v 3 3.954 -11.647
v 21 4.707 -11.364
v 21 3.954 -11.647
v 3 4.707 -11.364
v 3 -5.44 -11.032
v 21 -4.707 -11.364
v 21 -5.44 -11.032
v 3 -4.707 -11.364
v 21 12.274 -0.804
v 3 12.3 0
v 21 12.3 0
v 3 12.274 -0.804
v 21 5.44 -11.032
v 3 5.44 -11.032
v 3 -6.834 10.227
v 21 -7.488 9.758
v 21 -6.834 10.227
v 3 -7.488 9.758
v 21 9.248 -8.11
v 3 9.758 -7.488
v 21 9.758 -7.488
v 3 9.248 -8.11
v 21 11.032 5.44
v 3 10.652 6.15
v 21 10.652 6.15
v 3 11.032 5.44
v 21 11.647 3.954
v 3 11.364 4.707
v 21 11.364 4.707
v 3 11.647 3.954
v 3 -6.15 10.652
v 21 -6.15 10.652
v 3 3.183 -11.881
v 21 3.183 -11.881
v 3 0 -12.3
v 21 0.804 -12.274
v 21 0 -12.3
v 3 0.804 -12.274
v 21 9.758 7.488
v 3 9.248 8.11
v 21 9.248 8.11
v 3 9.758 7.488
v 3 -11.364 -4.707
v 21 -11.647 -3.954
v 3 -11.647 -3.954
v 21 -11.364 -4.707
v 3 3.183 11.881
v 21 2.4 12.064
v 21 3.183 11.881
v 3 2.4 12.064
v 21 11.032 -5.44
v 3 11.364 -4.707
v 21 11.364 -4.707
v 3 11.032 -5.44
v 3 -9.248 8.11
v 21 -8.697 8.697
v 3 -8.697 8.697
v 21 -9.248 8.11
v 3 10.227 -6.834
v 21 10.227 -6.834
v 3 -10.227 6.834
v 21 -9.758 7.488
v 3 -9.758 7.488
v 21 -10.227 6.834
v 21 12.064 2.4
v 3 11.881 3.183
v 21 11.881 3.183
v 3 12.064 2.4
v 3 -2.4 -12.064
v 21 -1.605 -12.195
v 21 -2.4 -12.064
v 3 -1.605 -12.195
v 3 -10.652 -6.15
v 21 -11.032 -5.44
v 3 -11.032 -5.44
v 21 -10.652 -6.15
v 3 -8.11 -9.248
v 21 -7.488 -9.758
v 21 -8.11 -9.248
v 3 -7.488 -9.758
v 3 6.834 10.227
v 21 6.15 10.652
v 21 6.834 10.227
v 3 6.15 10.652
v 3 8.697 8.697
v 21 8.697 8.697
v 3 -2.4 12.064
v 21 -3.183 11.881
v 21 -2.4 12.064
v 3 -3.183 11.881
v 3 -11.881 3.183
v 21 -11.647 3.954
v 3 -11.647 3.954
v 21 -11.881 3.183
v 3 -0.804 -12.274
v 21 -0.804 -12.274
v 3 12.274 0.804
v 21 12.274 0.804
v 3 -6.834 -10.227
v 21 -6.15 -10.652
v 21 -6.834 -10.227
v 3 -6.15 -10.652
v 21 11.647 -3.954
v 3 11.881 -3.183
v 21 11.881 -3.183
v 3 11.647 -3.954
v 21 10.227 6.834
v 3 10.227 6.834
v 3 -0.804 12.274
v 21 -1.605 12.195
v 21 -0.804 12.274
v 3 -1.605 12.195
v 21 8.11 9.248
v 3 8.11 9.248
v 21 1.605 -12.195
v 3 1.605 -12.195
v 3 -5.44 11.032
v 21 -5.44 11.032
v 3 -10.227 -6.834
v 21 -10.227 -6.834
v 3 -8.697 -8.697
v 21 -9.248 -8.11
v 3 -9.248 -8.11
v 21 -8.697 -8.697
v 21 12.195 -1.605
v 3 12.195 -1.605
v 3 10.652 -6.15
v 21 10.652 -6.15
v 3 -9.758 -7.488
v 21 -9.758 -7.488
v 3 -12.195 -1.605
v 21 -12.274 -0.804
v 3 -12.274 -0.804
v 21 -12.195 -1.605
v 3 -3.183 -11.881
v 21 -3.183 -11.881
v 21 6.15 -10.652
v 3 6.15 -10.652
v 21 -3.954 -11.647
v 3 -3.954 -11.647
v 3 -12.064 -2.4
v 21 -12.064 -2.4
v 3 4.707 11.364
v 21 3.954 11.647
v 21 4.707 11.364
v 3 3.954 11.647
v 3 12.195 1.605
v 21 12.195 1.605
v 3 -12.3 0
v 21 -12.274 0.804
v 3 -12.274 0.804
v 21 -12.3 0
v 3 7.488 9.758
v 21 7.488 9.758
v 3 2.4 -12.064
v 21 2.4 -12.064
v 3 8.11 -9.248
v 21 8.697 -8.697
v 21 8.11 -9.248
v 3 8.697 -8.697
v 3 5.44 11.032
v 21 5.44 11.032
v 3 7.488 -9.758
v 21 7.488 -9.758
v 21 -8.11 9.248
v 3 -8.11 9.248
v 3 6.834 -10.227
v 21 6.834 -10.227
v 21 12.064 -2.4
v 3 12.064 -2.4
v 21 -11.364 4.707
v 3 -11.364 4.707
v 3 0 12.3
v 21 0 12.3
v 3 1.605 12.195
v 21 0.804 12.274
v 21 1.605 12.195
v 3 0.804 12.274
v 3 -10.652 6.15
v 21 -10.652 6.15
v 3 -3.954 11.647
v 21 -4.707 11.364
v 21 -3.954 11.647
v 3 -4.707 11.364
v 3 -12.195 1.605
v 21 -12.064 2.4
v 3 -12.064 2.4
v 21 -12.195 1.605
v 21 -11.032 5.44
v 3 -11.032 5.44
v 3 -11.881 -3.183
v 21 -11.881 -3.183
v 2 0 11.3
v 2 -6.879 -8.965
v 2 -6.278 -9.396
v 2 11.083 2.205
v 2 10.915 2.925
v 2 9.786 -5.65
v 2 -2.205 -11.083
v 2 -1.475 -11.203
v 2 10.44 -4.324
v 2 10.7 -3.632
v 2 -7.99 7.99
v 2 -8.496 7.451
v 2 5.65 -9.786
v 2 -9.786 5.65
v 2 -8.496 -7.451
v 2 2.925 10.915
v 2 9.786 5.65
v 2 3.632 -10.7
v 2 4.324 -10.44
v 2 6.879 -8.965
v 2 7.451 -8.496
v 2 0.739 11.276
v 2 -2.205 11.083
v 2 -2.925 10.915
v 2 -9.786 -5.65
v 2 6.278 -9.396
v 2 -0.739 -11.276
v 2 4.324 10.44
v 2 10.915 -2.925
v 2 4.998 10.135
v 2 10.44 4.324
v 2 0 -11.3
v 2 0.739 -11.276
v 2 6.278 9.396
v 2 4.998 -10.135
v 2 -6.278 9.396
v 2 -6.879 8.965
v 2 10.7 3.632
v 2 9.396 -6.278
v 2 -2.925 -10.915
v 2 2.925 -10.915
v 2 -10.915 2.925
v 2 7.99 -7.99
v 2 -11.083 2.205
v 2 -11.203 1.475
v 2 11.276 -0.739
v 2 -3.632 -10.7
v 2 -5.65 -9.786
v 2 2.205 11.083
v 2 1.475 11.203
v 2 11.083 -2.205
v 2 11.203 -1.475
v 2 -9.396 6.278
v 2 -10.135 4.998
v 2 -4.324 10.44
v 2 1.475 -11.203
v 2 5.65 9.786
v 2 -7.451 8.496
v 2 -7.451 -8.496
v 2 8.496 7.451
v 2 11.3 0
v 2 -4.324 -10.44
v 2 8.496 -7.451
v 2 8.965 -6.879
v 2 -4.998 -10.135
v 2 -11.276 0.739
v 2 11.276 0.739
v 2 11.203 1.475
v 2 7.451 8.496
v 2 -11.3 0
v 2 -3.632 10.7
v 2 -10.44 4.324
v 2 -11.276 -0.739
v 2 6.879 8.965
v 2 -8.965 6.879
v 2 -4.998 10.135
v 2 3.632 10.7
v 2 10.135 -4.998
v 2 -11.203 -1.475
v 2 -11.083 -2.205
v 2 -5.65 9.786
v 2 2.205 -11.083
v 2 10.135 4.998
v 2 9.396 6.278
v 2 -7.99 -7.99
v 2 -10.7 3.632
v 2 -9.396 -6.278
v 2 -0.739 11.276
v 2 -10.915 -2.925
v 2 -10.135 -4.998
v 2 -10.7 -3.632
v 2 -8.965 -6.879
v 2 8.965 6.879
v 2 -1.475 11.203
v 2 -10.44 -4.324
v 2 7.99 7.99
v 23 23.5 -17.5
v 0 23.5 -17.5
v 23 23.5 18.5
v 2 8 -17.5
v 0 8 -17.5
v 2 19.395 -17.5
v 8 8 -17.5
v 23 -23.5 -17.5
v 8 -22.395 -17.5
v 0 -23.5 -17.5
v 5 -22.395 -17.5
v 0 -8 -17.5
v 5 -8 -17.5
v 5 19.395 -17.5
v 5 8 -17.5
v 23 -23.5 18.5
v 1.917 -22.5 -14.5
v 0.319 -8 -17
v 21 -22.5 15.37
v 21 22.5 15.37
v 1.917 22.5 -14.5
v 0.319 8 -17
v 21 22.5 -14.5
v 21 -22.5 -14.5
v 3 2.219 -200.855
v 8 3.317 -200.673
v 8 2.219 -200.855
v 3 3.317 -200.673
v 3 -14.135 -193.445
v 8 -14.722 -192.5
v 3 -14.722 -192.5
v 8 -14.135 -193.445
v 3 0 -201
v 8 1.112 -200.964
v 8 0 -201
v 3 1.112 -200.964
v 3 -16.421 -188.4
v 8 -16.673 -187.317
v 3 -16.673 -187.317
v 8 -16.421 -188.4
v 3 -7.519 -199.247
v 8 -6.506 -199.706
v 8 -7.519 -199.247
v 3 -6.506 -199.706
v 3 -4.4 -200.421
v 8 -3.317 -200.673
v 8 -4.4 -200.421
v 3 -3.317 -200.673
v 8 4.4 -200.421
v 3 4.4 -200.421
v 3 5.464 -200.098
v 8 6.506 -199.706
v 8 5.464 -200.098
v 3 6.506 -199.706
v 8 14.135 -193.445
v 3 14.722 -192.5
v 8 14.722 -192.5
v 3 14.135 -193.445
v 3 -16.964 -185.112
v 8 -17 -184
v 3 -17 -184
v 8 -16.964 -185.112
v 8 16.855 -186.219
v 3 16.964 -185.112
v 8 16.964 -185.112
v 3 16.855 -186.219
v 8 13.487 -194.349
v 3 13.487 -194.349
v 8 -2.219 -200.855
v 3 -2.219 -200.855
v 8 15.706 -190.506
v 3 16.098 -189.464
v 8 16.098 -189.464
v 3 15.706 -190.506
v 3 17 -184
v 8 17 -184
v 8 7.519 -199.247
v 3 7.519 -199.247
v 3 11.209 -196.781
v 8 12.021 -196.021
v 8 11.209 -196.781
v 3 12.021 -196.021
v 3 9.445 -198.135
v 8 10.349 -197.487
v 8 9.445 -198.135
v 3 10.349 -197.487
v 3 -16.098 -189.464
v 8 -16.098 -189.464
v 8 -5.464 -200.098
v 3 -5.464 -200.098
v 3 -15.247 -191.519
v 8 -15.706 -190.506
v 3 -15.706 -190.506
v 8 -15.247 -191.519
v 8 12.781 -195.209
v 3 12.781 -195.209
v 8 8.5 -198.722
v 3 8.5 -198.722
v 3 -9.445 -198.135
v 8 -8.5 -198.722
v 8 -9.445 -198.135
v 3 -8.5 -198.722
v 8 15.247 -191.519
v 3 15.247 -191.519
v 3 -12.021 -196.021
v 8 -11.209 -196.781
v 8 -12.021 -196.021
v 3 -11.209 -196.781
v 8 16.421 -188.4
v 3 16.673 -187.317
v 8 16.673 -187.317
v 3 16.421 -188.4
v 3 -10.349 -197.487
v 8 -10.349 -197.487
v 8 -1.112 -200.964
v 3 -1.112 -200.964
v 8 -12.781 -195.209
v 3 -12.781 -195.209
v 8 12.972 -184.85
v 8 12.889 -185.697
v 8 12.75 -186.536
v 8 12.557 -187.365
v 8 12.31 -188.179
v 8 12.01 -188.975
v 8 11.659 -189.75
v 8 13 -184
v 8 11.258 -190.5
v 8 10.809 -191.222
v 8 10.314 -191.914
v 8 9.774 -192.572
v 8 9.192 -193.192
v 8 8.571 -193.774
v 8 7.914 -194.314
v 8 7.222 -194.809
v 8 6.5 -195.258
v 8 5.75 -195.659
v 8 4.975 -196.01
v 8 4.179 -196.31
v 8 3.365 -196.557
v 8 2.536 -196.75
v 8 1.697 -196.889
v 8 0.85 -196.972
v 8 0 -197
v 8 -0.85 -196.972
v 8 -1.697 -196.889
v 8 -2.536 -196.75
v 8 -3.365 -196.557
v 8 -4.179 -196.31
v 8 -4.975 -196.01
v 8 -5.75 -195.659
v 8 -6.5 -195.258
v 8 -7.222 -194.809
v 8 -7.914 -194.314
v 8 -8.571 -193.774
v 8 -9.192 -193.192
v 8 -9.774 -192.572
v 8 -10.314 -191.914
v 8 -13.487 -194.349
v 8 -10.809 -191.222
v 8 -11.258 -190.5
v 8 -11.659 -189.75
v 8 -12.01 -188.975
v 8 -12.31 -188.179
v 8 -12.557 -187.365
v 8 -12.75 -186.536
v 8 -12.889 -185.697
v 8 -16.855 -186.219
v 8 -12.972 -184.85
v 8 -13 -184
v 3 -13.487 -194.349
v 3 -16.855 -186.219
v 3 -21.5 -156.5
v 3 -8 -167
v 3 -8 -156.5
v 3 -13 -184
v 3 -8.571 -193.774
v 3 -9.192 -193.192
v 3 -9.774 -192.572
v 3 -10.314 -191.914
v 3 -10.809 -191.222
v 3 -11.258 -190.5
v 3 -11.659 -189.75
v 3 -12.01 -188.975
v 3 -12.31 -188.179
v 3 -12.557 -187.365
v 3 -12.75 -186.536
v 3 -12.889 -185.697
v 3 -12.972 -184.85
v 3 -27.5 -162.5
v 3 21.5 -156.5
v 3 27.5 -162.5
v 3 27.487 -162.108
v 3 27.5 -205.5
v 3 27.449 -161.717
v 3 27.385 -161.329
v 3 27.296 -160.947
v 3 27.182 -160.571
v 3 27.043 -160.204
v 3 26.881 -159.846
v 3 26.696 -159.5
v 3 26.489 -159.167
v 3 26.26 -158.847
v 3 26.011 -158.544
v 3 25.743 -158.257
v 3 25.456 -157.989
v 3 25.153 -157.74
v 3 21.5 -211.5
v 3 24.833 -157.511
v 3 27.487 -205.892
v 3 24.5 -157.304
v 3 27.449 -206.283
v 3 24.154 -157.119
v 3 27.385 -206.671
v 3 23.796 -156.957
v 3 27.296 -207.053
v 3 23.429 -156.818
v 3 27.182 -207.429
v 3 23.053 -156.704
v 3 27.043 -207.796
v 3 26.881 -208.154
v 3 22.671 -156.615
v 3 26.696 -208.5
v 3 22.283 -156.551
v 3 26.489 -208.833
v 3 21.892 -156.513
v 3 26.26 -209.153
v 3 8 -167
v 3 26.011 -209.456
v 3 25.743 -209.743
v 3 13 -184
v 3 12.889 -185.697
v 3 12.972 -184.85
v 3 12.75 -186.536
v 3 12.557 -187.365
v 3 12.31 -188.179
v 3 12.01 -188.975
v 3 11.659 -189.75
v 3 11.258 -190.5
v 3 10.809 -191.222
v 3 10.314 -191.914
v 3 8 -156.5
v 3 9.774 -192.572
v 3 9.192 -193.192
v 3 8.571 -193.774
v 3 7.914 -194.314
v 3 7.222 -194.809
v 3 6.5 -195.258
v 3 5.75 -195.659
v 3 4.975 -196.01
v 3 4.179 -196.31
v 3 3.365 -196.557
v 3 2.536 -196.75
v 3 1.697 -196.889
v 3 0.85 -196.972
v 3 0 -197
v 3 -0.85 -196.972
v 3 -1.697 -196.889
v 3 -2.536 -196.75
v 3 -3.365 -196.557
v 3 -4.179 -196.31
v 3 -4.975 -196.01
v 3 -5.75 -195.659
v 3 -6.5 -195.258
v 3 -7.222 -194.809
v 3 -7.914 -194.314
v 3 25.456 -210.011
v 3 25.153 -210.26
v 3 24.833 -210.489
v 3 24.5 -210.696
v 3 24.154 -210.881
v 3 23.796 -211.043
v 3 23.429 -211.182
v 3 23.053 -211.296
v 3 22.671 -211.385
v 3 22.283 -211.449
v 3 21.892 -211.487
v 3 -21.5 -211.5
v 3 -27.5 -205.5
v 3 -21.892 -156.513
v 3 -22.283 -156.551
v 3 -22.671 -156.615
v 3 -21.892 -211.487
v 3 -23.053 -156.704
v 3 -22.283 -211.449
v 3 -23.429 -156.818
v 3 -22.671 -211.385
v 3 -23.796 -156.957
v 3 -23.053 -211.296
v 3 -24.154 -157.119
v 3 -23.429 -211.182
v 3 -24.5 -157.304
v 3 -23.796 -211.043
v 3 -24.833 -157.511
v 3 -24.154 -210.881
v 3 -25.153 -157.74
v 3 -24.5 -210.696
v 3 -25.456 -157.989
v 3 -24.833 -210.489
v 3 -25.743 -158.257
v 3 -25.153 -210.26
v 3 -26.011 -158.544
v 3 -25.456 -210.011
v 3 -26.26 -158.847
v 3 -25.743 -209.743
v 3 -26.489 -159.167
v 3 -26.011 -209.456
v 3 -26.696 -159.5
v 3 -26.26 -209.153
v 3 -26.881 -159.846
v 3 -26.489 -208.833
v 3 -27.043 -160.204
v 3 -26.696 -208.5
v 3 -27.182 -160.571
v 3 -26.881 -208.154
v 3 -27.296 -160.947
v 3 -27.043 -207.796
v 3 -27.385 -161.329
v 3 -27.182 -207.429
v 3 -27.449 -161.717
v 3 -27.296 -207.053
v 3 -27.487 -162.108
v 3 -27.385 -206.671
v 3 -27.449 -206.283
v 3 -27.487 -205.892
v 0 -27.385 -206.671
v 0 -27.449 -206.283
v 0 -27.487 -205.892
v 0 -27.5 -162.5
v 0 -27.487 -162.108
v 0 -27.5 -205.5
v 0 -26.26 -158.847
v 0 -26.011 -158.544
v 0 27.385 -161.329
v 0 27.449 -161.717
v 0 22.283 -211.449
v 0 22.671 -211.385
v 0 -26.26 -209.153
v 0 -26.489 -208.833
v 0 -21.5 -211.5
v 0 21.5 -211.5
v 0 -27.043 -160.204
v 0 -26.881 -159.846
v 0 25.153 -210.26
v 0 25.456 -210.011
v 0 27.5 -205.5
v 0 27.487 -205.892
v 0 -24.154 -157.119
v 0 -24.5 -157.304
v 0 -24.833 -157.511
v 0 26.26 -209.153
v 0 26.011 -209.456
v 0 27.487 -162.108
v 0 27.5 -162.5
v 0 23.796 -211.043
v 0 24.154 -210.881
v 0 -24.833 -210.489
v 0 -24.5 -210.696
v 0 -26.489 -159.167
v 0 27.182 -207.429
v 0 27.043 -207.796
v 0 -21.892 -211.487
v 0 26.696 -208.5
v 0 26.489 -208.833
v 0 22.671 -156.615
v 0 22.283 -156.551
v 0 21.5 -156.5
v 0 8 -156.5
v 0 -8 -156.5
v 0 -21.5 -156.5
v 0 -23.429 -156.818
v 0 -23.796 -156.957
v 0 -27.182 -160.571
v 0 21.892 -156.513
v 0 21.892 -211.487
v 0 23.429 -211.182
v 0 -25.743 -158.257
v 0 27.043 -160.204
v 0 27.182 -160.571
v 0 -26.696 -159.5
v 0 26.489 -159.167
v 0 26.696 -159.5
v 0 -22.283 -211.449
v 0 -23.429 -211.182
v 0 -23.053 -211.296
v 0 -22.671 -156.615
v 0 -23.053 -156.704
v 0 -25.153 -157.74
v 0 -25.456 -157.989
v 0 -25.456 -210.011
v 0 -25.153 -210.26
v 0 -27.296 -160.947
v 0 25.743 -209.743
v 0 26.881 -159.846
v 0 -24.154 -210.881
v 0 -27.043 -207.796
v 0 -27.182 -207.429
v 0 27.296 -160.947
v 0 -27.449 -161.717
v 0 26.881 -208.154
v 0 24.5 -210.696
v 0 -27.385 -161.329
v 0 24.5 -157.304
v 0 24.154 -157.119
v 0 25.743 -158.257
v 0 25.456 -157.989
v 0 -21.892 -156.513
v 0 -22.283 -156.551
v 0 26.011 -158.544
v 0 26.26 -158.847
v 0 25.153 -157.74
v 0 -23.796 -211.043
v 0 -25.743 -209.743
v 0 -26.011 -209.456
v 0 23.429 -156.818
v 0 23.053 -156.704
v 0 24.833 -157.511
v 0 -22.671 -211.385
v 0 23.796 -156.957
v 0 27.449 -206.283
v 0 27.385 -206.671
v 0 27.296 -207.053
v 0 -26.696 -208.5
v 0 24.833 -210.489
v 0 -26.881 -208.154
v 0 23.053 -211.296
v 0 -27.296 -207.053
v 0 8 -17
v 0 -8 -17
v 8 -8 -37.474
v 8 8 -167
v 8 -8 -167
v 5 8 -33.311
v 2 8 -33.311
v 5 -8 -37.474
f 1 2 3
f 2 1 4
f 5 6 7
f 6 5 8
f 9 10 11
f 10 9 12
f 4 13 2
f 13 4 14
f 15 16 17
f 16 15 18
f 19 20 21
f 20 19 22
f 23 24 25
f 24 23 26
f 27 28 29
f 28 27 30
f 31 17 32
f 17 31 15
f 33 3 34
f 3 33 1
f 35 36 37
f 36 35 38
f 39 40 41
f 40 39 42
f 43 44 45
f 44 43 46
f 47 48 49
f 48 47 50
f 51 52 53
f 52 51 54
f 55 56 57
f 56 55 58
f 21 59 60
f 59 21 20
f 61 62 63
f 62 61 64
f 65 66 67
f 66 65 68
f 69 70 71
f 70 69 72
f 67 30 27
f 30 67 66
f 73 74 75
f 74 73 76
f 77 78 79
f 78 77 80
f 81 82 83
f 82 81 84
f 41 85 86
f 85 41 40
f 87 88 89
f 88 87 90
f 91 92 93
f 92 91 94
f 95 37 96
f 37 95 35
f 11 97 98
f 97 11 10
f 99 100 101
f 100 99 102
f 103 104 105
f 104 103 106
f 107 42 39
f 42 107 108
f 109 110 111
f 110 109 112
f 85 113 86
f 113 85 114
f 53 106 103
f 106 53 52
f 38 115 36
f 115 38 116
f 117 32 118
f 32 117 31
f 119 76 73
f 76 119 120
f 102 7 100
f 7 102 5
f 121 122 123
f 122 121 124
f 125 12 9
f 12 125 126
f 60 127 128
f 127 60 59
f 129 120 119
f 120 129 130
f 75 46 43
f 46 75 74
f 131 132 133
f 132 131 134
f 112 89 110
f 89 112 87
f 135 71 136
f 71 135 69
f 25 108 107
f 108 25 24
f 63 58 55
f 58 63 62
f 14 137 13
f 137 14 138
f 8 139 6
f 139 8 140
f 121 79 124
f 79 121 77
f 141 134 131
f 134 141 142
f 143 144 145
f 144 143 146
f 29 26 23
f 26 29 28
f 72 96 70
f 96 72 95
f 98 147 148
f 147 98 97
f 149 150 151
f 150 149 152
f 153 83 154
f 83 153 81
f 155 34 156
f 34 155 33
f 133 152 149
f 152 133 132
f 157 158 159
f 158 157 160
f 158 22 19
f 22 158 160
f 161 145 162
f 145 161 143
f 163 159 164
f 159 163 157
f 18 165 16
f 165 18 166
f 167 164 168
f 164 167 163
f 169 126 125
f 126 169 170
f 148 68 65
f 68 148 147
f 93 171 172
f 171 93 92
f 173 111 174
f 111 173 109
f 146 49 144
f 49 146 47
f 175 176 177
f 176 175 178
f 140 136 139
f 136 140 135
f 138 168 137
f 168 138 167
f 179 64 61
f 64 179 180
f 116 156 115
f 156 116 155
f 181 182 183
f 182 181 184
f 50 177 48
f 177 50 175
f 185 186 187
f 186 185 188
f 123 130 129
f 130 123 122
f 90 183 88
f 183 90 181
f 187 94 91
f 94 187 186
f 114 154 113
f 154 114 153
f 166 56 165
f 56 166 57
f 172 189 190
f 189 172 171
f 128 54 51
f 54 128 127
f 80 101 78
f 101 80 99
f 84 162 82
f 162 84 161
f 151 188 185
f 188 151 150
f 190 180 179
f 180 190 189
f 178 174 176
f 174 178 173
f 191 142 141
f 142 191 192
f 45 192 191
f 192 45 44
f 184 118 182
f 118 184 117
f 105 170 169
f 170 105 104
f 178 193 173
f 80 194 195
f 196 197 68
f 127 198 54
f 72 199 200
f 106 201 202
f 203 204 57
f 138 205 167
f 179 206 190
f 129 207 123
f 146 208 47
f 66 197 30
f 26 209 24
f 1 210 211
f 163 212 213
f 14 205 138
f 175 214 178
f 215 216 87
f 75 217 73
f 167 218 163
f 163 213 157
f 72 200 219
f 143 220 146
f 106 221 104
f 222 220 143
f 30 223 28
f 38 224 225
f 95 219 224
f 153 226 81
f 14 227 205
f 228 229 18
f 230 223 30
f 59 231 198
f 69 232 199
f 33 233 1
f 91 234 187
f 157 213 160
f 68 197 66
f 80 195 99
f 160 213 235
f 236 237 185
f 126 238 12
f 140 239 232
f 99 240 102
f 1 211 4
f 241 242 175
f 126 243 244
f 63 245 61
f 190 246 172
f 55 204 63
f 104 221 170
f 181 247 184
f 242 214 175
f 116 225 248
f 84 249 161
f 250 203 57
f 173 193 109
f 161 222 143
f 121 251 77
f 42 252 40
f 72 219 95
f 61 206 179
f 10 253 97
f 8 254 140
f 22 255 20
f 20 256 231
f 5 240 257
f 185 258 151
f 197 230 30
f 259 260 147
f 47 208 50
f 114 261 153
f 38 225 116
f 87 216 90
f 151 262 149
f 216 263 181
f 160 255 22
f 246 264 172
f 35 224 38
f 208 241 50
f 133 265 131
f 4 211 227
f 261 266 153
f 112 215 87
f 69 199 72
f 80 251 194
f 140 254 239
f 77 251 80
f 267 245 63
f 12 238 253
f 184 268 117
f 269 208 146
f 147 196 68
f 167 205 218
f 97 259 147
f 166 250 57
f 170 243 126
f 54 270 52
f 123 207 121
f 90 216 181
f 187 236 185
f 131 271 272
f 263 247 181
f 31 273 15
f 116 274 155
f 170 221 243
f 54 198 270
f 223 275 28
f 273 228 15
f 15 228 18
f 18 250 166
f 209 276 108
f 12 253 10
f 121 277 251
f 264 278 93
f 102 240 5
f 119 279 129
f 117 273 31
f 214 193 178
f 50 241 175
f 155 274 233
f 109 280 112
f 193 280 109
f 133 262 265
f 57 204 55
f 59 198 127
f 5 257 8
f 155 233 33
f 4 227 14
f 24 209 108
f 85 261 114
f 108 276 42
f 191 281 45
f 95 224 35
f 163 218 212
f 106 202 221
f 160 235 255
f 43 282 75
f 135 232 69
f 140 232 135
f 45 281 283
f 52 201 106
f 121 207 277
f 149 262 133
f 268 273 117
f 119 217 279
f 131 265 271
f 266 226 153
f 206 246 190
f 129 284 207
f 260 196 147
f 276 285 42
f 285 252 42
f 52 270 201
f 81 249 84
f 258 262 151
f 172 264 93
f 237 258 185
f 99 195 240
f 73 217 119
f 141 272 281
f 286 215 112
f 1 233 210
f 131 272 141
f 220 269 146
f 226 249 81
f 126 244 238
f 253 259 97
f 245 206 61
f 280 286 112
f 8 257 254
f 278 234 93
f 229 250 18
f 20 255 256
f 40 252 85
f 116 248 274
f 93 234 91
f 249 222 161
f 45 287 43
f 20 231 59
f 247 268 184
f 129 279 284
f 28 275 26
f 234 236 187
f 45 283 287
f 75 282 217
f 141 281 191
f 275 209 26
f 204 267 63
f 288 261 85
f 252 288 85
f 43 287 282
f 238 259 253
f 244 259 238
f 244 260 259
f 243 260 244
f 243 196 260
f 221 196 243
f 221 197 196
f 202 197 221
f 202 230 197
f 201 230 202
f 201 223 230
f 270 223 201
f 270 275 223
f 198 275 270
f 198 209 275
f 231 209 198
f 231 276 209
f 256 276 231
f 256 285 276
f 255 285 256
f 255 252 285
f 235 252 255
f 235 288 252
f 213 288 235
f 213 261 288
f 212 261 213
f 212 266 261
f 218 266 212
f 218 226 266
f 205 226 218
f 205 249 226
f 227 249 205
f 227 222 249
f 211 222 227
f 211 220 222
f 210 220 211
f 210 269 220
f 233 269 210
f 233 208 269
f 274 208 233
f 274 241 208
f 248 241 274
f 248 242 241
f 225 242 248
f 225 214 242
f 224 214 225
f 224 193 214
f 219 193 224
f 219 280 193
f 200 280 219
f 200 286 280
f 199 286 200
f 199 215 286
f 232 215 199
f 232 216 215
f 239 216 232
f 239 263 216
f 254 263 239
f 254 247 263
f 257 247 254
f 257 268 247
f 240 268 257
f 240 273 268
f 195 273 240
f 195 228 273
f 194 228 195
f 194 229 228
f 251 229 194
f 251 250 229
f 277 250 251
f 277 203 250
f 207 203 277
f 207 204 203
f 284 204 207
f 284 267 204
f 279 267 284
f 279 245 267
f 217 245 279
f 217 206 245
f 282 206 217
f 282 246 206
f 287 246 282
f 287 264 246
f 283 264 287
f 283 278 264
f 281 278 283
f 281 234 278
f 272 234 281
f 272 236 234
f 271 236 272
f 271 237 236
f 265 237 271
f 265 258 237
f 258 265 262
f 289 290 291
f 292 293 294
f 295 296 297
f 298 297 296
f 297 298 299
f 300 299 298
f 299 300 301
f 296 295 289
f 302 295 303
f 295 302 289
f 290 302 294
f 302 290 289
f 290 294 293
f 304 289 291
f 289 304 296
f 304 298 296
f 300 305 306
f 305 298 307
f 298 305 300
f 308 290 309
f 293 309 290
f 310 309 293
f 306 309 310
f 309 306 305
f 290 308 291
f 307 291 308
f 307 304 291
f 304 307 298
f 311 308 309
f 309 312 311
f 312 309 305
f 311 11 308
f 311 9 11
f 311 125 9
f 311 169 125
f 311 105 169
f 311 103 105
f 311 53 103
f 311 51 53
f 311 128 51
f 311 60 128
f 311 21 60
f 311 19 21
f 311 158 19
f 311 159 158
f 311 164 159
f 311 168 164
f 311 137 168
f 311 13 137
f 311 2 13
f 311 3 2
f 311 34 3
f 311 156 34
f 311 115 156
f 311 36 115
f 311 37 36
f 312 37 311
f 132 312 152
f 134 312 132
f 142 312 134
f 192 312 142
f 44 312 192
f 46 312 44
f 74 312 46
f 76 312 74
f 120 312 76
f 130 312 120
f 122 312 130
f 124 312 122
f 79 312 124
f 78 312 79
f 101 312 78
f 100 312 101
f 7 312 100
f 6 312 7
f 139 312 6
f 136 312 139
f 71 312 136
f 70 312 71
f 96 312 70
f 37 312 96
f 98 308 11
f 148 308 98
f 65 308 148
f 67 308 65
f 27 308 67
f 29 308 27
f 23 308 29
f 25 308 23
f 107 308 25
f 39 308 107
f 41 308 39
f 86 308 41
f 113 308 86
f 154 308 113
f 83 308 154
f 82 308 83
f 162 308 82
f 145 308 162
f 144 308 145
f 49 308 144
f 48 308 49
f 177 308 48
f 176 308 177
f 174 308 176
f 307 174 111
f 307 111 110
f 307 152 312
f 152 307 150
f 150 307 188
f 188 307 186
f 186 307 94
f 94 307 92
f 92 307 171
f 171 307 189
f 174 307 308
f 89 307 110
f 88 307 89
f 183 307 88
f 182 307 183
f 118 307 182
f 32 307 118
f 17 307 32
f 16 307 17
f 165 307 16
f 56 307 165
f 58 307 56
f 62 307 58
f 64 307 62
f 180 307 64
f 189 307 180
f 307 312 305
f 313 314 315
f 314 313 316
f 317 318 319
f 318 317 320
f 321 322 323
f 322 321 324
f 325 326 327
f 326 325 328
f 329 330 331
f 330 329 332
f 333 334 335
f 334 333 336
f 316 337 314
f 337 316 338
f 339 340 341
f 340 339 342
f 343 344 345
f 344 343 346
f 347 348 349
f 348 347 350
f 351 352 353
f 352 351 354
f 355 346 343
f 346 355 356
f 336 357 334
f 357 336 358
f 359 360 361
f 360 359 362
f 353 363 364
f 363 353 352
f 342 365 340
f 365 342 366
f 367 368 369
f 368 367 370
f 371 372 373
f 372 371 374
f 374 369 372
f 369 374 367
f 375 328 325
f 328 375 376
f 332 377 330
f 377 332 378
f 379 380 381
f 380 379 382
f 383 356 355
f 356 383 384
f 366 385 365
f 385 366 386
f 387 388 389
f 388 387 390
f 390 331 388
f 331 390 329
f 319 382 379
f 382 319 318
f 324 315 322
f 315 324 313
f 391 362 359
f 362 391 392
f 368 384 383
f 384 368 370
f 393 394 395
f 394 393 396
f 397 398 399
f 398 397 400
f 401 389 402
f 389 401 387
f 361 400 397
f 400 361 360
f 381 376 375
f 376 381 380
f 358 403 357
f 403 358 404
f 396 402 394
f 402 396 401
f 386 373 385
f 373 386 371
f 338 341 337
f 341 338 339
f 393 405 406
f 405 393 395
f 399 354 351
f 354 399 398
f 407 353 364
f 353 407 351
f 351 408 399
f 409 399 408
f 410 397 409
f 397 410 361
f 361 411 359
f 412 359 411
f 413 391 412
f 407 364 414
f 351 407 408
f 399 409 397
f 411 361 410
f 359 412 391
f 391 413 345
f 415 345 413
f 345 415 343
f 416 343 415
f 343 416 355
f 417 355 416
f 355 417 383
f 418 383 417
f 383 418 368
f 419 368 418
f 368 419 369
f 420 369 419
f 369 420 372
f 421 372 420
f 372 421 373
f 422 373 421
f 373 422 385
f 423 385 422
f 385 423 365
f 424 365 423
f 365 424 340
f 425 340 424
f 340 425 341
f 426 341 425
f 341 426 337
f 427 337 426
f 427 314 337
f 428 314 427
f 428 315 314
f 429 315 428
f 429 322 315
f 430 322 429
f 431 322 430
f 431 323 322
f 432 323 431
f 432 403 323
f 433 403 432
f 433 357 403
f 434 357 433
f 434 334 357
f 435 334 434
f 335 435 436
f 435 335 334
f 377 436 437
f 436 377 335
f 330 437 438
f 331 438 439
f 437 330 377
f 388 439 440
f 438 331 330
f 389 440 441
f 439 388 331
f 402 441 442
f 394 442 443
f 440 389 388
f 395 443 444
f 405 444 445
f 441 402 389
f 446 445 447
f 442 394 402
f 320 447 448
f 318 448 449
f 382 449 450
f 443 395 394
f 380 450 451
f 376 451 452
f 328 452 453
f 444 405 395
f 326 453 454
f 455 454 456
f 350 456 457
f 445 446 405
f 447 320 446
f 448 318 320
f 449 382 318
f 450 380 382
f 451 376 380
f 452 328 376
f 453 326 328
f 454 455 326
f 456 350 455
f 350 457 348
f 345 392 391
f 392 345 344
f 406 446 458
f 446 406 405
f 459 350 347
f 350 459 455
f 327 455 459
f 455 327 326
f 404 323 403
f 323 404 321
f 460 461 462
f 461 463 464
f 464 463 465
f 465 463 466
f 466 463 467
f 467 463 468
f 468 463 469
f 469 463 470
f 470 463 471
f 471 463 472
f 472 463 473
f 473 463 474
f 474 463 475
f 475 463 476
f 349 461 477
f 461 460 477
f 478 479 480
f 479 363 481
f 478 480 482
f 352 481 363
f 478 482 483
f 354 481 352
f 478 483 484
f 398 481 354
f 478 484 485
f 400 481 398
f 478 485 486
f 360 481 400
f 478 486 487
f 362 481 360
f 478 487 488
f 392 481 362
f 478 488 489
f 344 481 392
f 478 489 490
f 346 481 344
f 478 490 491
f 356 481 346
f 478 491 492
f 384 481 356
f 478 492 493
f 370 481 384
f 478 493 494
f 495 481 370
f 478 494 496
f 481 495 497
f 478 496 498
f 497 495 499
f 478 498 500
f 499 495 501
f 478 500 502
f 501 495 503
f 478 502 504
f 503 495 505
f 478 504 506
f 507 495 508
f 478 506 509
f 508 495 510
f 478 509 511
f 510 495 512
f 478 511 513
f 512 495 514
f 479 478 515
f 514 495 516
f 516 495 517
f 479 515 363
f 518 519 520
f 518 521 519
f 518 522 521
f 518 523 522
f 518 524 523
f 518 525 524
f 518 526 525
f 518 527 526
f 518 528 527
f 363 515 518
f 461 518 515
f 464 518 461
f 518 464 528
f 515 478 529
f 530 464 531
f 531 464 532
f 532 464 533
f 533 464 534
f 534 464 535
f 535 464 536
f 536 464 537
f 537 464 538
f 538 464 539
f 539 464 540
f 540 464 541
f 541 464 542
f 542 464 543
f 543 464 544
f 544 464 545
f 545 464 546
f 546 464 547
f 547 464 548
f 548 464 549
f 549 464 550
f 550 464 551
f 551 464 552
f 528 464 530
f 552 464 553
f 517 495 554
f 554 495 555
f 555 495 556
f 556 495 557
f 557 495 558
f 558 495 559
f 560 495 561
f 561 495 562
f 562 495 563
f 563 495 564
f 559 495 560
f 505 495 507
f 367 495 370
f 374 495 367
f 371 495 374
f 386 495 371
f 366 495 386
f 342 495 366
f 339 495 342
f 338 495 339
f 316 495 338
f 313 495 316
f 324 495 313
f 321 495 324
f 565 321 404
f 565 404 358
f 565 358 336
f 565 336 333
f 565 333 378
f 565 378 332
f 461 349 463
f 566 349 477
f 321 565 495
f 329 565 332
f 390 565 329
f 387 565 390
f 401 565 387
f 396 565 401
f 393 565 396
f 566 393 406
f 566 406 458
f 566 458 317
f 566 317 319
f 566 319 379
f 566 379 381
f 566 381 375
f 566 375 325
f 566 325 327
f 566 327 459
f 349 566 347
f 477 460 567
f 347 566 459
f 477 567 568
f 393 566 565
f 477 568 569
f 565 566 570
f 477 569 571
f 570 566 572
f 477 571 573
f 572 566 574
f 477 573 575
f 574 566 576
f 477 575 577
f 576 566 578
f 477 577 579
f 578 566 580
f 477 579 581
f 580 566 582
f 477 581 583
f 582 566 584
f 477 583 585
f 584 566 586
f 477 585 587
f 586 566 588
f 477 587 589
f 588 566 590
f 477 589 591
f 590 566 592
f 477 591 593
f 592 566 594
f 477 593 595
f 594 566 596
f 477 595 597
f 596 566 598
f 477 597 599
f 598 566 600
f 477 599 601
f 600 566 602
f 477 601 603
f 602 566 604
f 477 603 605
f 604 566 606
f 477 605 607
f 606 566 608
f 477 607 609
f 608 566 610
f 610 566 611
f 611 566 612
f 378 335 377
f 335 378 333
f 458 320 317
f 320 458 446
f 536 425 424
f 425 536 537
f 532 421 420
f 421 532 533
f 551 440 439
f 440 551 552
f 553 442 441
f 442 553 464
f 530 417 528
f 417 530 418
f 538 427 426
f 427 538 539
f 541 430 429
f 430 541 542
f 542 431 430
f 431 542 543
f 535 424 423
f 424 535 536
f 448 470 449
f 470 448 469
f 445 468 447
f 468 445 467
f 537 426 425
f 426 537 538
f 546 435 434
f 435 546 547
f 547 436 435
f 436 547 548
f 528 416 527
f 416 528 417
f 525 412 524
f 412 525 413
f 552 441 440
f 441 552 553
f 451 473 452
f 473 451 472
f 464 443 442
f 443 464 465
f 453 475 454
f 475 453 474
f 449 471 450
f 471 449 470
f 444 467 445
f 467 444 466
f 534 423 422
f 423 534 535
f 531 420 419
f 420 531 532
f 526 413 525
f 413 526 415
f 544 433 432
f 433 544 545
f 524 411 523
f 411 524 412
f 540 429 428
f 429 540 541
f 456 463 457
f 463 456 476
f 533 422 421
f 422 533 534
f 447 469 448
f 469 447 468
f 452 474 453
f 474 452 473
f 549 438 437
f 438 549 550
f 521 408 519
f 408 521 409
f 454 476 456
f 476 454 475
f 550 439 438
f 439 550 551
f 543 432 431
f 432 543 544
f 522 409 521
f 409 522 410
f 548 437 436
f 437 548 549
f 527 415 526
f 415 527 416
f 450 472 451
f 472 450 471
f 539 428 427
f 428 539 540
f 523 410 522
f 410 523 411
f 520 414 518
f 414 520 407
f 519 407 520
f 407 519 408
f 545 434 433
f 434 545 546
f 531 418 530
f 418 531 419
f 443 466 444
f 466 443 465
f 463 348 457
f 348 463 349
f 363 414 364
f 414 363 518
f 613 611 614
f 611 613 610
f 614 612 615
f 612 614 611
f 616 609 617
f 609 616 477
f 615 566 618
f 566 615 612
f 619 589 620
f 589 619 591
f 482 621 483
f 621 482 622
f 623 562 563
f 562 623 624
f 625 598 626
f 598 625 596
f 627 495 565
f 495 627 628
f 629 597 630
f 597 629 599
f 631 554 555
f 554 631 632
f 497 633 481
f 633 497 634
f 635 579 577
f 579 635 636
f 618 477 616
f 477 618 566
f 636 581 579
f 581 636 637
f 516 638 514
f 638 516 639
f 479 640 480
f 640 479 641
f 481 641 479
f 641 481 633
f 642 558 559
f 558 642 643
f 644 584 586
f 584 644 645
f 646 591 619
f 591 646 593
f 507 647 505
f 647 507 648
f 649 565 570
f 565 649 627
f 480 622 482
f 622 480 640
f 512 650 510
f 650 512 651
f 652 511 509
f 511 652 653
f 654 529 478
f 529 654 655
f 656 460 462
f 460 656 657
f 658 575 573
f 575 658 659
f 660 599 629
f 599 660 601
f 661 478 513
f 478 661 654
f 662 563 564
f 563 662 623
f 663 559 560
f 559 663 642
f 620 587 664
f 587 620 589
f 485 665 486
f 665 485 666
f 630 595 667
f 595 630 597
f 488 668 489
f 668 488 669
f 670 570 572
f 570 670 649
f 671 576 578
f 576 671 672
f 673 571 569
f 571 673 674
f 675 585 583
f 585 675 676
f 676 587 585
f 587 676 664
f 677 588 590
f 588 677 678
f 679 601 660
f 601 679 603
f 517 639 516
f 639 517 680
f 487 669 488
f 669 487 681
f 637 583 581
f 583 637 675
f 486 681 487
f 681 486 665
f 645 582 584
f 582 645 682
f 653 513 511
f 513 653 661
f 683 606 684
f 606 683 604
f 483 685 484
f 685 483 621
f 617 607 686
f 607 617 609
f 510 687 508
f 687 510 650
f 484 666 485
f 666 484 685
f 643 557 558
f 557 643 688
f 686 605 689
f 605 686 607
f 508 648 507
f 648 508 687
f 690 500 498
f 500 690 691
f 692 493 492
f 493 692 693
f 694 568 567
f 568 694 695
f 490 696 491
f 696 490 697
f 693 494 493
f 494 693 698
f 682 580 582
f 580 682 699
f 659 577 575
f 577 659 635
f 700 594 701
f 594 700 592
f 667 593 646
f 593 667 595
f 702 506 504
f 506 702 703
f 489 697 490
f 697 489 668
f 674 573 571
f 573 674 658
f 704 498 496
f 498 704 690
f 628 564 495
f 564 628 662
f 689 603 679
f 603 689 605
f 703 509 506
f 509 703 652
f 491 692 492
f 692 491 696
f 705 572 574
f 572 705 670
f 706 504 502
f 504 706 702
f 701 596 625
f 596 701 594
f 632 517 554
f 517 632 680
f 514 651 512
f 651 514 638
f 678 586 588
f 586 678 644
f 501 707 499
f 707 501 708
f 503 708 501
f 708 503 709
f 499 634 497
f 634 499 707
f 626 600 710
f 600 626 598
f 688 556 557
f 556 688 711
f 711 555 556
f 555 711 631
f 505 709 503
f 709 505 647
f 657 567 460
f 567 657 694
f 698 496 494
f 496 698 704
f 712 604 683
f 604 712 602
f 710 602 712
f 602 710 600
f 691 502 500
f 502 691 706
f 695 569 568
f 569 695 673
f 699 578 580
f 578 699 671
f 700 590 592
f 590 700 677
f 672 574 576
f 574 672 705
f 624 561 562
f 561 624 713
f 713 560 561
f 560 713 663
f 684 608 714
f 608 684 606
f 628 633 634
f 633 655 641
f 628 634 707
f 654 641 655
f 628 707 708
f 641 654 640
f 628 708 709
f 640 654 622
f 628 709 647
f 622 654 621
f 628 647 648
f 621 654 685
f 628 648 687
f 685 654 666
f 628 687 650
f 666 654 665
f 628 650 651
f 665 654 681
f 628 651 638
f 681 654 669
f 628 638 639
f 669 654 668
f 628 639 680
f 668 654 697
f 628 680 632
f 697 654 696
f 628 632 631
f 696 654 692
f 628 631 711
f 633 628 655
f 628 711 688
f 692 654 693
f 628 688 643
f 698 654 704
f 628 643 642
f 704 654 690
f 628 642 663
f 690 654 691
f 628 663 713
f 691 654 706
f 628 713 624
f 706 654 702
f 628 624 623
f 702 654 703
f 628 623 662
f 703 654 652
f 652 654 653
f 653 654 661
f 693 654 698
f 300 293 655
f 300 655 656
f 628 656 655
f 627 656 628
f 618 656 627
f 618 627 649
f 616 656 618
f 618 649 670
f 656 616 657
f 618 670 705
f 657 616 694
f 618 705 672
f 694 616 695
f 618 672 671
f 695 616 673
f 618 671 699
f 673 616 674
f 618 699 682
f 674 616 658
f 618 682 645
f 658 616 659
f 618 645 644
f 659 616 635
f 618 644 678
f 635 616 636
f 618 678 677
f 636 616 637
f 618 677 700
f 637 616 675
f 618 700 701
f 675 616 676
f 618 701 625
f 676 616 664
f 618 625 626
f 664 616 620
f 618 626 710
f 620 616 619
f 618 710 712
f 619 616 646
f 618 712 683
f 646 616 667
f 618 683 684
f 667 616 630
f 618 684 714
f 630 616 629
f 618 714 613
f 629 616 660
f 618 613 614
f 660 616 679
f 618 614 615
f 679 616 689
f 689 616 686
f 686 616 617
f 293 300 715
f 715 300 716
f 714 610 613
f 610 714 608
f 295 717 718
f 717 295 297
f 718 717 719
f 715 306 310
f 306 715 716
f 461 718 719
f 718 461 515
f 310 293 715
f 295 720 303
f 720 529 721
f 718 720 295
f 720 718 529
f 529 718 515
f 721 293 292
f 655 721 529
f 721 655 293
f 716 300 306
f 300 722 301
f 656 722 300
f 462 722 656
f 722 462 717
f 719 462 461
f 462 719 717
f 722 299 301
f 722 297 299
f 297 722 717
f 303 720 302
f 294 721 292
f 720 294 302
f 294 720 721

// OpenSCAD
// ============================================================
// φ25×19ピンで既存受けに差し込み、150mm下に「Wall Guard風」受けを付ける
// - 下側：角丸プレート + 低いリング(リム) + 中央の浅い皿（例示画像に寄せる）
// ============================================================

$fn = 96;

// ---------- 表示 ----------
show_adapter = true;
show_test_tension_rod = false;

// ---------- 差し込みピン（既存受けへ） ----------
pin_d_nominal = 25;
pin_len       = 19;
pin_clearance = 0.4;
pin_chamfer   = 1.0;
pin_delimiter = 9; // 壁付きのピン受けの最大厚み

// ---------- 吊り下げ ----------
drop_mm = 150;

// アーム
arm_th = 8.0;  // X厚
arm_w  = 16.0; // Y幅
arm_len = drop_mm;
neck_h = 10.0;

// ---------- 下側：Wall Guard風 ----------
plate_w = 55;
plate_h = 55;
plate_t = 3.0;
plate_r = 6.0;     // 角丸R（例示っぽく）

// 受け座（リング＋皿）
rim_od   = 34;      // 受け座リング外径（キャップより少し大きい）
rim_id   = 26;      // 受け座リング内径（キャップ外径に近い）
rim_h    = 5.0;     // リング高さ（低め）

dish_d     = 18;    // 中央の浅い皿 直径
dish_depth = 2.0;   // 皿深さ

// プレートとリングの“つながり”の滑らかさ
blend_h = 2.0;      // 0〜3程度：大きいほどなだらか

// ---------- テスト用：突っ張り棒端（簡易） ----------
test_endcap_d = 28; // 端キャップ径イメージ
test_endcap_t = 6;
test_rod_d     = 25;
test_rod_len   = 120;

// ---- A: ガセット（補強リブ） ----
gusset_len   = 16;   // Z方向（下方向）への伸び
gusset_h     = 14;   // X方向（外側）への伸び
gusset_y_th  = 3.0;  // ガセット1枚の厚み（Y方向）
gusset_gap   = 0.6;  // アーム側面から少し離す/食い込ませ回避
gusset_inset = 0.2;  // 壁面側へ少しめり込ませて隙間対策

// ============================================================
// 角丸四角（2D）
// ============================================================
module rounded_rect_2d(w, h, r){
  r2 = min(r, min(w,h)/2);
  offset(r=r2) square([w-2*r2, h-2*r2], center=true);
}

// 角丸プレート（3D）
module rounded_plate(w,h,t,r){
  linear_extrude(height=t, center=false)
    rounded_rect_2d(w,h,r);
}

// ============================================================
// 差し込みピン（+X方向へ）
// ============================================================
module insert_pin(){
  pin_d = pin_d_nominal - pin_clearance;

  color([0.95,0.8,0.15,1.0])
    translate([plate_t,0,0]){
        union(){
            rotate([0,90,0])
            translate([0,0,0]){
                cylinder(h=pin_len, r=pin_d/2, center=false);
            }
            translate([0,0,0])
            rotate([0,-90,0])
                cylinder(h=pin_chamfer,
                        r1=pin_d/2,
                        r2=max(pin_d/2 - pin_chamfer, 0.1),
                        center=false);
        }
    }

    translate([0,0,-pin_len + pin_delimiter/2]){
        rotate([90,0,0]){
            difference(){
                translate([0,-3,0]){
                    linear_extrude(height = 45+2, center = true){
                        polygon(points = [
                            [0, 0],   // 直角の頂点
                            [pin_len + 2+2, 0], 
                            [pin_len + 2+2, pin_d_nominal+(pin_delimiter+2)] 
                        ]);
                    }
                }
                linear_extrude(height = 45, center = true){
                    polygon(points = [
                        [0, 0],   // 直角の頂点
                        [pin_len + 2, 0],  
                        [pin_len + 2, pin_d_nominal+(pin_delimiter+2)] 
                    ]);
                }
            }
        }
    }

}

// ============================================================
// Wall Guard風 受け（例示に寄せた構造）
// 座標：壁面を x=0 とし、プレートの壁当たり面が x=0 に来るようにする
// ＝プレート厚は +x 側へ
// ============================================================
module wall_guard_like(){
  color([0.95,0.8,0.15,1.0])
  difference(){
    union(){
      // 1) 角丸プレート
      translate([0,0,0])
        rotate([0,90,0])
            rounded_plate(plate_w, plate_h, plate_t, plate_r);

      // 2) リング本体（中空）
      difference(){
        translate([plate_t + rim_h/2, 0, 0])
          rotate([0,90,0])
            cylinder(h=rim_h, r=rim_od/2, center=true);

        translate([plate_t + rim_h/2, 0, 0])
          rotate([0,90,0])
            cylinder(h=rim_h+0.4, r=rim_id/2, center=true);

        translate([plate_t + rim_h/2, 0, rim_od/2/2])
          rotate([0,90,0])
            cube([rim_od/2, rim_od+0.4,rim_h+0.4], center=true);
      }
    }
  }
}

// ============================================================
// A) アーム根元のガセット（片側）
// 断面は X-Z 平面の三角形、Y方向に厚み gusset_y_th で押し出し
// ============================================================
module arm_gusset_one(side=+1){
  // side=+1: +Y側, side=-1: -Y側
  y0 = side*(arm_w/2 + gusset_gap - 14);  // アーム外側へ少しオフセット
  rotate_x = (side == +1) ? 0 : 180;
  // Z=0 をアーム上端に合わせて使う想定（呼び出し側で translate）
  translate([gusset_y_th+2, y0 - gusset_y_th/2, -gusset_y_th])
    rotate([rotate_x,90,0]){
        linear_extrude(height=gusset_y_th, center=false)
        polygon(points=[
            [plate_t - gusset_inset, 0],                 // 根元（壁側寄り）
            [plate_t + arm_th + gusset_h, 0],            // 外へ
            [plate_t - gusset_inset, -gusset_len]        // 下へ（アーム方向）
        ]);
        }
}

// 両側に配置
module arm_gusset_both(){
  union(){
    arm_gusset_one(+1);
    arm_gusset_one(-1);
  }
}

// ============================================================
// アダプタ全体
// ============================================================
module adapter(){
  union(){
    // 上：差し込みピン
    insert_pin();

    translate([0, 0, -(pin_delimiter-2)]){
        union()
        // アーム
            color([0.95,0.8,0.15,1.0])
            translate([arm_th/2, 0, -(neck_h + arm_len/2 )])
                cube([arm_th, arm_w, arm_len], center=true);

            // 下：Wall Guard風
            translate([0,0,-(neck_h + arm_len + rim_od/2)])
            wall_guard_like();
        }
    }

    // ★A: ガセット（アーム上端付近 = Zが -neck_h）
    color([0.95,0.8,0.15,1.0])
    translate([0, 0, -neck_h-1])
    arm_gusset_both();

}

// ============================================================
// テスト用：突っ張り棒端
// ============================================================
module test_tension_rod(){
  z = -(neck_h + arm_len);
  color([0.9,0.1,0.1,0.55])
  union(){
    // 端キャップ（プレートに当たる）
    translate([plate_t + test_endcap_t/2, 0, z])
      rotate([0,90,0])
        cylinder(h=test_endcap_t, r=test_endcap_d/2, center=true);

    // 棒本体
    translate([plate_t + test_endcap_t + test_rod_len/2, 0, z])
      rotate([0,90,0])
        cylinder(h=test_rod_len, r=test_rod_d/2, center=true);
  }
}

// ============================================================
// 出力
// ============================================================
if (show_adapter) adapter();
if (show_test_tension_rod) test_tension_rod();
